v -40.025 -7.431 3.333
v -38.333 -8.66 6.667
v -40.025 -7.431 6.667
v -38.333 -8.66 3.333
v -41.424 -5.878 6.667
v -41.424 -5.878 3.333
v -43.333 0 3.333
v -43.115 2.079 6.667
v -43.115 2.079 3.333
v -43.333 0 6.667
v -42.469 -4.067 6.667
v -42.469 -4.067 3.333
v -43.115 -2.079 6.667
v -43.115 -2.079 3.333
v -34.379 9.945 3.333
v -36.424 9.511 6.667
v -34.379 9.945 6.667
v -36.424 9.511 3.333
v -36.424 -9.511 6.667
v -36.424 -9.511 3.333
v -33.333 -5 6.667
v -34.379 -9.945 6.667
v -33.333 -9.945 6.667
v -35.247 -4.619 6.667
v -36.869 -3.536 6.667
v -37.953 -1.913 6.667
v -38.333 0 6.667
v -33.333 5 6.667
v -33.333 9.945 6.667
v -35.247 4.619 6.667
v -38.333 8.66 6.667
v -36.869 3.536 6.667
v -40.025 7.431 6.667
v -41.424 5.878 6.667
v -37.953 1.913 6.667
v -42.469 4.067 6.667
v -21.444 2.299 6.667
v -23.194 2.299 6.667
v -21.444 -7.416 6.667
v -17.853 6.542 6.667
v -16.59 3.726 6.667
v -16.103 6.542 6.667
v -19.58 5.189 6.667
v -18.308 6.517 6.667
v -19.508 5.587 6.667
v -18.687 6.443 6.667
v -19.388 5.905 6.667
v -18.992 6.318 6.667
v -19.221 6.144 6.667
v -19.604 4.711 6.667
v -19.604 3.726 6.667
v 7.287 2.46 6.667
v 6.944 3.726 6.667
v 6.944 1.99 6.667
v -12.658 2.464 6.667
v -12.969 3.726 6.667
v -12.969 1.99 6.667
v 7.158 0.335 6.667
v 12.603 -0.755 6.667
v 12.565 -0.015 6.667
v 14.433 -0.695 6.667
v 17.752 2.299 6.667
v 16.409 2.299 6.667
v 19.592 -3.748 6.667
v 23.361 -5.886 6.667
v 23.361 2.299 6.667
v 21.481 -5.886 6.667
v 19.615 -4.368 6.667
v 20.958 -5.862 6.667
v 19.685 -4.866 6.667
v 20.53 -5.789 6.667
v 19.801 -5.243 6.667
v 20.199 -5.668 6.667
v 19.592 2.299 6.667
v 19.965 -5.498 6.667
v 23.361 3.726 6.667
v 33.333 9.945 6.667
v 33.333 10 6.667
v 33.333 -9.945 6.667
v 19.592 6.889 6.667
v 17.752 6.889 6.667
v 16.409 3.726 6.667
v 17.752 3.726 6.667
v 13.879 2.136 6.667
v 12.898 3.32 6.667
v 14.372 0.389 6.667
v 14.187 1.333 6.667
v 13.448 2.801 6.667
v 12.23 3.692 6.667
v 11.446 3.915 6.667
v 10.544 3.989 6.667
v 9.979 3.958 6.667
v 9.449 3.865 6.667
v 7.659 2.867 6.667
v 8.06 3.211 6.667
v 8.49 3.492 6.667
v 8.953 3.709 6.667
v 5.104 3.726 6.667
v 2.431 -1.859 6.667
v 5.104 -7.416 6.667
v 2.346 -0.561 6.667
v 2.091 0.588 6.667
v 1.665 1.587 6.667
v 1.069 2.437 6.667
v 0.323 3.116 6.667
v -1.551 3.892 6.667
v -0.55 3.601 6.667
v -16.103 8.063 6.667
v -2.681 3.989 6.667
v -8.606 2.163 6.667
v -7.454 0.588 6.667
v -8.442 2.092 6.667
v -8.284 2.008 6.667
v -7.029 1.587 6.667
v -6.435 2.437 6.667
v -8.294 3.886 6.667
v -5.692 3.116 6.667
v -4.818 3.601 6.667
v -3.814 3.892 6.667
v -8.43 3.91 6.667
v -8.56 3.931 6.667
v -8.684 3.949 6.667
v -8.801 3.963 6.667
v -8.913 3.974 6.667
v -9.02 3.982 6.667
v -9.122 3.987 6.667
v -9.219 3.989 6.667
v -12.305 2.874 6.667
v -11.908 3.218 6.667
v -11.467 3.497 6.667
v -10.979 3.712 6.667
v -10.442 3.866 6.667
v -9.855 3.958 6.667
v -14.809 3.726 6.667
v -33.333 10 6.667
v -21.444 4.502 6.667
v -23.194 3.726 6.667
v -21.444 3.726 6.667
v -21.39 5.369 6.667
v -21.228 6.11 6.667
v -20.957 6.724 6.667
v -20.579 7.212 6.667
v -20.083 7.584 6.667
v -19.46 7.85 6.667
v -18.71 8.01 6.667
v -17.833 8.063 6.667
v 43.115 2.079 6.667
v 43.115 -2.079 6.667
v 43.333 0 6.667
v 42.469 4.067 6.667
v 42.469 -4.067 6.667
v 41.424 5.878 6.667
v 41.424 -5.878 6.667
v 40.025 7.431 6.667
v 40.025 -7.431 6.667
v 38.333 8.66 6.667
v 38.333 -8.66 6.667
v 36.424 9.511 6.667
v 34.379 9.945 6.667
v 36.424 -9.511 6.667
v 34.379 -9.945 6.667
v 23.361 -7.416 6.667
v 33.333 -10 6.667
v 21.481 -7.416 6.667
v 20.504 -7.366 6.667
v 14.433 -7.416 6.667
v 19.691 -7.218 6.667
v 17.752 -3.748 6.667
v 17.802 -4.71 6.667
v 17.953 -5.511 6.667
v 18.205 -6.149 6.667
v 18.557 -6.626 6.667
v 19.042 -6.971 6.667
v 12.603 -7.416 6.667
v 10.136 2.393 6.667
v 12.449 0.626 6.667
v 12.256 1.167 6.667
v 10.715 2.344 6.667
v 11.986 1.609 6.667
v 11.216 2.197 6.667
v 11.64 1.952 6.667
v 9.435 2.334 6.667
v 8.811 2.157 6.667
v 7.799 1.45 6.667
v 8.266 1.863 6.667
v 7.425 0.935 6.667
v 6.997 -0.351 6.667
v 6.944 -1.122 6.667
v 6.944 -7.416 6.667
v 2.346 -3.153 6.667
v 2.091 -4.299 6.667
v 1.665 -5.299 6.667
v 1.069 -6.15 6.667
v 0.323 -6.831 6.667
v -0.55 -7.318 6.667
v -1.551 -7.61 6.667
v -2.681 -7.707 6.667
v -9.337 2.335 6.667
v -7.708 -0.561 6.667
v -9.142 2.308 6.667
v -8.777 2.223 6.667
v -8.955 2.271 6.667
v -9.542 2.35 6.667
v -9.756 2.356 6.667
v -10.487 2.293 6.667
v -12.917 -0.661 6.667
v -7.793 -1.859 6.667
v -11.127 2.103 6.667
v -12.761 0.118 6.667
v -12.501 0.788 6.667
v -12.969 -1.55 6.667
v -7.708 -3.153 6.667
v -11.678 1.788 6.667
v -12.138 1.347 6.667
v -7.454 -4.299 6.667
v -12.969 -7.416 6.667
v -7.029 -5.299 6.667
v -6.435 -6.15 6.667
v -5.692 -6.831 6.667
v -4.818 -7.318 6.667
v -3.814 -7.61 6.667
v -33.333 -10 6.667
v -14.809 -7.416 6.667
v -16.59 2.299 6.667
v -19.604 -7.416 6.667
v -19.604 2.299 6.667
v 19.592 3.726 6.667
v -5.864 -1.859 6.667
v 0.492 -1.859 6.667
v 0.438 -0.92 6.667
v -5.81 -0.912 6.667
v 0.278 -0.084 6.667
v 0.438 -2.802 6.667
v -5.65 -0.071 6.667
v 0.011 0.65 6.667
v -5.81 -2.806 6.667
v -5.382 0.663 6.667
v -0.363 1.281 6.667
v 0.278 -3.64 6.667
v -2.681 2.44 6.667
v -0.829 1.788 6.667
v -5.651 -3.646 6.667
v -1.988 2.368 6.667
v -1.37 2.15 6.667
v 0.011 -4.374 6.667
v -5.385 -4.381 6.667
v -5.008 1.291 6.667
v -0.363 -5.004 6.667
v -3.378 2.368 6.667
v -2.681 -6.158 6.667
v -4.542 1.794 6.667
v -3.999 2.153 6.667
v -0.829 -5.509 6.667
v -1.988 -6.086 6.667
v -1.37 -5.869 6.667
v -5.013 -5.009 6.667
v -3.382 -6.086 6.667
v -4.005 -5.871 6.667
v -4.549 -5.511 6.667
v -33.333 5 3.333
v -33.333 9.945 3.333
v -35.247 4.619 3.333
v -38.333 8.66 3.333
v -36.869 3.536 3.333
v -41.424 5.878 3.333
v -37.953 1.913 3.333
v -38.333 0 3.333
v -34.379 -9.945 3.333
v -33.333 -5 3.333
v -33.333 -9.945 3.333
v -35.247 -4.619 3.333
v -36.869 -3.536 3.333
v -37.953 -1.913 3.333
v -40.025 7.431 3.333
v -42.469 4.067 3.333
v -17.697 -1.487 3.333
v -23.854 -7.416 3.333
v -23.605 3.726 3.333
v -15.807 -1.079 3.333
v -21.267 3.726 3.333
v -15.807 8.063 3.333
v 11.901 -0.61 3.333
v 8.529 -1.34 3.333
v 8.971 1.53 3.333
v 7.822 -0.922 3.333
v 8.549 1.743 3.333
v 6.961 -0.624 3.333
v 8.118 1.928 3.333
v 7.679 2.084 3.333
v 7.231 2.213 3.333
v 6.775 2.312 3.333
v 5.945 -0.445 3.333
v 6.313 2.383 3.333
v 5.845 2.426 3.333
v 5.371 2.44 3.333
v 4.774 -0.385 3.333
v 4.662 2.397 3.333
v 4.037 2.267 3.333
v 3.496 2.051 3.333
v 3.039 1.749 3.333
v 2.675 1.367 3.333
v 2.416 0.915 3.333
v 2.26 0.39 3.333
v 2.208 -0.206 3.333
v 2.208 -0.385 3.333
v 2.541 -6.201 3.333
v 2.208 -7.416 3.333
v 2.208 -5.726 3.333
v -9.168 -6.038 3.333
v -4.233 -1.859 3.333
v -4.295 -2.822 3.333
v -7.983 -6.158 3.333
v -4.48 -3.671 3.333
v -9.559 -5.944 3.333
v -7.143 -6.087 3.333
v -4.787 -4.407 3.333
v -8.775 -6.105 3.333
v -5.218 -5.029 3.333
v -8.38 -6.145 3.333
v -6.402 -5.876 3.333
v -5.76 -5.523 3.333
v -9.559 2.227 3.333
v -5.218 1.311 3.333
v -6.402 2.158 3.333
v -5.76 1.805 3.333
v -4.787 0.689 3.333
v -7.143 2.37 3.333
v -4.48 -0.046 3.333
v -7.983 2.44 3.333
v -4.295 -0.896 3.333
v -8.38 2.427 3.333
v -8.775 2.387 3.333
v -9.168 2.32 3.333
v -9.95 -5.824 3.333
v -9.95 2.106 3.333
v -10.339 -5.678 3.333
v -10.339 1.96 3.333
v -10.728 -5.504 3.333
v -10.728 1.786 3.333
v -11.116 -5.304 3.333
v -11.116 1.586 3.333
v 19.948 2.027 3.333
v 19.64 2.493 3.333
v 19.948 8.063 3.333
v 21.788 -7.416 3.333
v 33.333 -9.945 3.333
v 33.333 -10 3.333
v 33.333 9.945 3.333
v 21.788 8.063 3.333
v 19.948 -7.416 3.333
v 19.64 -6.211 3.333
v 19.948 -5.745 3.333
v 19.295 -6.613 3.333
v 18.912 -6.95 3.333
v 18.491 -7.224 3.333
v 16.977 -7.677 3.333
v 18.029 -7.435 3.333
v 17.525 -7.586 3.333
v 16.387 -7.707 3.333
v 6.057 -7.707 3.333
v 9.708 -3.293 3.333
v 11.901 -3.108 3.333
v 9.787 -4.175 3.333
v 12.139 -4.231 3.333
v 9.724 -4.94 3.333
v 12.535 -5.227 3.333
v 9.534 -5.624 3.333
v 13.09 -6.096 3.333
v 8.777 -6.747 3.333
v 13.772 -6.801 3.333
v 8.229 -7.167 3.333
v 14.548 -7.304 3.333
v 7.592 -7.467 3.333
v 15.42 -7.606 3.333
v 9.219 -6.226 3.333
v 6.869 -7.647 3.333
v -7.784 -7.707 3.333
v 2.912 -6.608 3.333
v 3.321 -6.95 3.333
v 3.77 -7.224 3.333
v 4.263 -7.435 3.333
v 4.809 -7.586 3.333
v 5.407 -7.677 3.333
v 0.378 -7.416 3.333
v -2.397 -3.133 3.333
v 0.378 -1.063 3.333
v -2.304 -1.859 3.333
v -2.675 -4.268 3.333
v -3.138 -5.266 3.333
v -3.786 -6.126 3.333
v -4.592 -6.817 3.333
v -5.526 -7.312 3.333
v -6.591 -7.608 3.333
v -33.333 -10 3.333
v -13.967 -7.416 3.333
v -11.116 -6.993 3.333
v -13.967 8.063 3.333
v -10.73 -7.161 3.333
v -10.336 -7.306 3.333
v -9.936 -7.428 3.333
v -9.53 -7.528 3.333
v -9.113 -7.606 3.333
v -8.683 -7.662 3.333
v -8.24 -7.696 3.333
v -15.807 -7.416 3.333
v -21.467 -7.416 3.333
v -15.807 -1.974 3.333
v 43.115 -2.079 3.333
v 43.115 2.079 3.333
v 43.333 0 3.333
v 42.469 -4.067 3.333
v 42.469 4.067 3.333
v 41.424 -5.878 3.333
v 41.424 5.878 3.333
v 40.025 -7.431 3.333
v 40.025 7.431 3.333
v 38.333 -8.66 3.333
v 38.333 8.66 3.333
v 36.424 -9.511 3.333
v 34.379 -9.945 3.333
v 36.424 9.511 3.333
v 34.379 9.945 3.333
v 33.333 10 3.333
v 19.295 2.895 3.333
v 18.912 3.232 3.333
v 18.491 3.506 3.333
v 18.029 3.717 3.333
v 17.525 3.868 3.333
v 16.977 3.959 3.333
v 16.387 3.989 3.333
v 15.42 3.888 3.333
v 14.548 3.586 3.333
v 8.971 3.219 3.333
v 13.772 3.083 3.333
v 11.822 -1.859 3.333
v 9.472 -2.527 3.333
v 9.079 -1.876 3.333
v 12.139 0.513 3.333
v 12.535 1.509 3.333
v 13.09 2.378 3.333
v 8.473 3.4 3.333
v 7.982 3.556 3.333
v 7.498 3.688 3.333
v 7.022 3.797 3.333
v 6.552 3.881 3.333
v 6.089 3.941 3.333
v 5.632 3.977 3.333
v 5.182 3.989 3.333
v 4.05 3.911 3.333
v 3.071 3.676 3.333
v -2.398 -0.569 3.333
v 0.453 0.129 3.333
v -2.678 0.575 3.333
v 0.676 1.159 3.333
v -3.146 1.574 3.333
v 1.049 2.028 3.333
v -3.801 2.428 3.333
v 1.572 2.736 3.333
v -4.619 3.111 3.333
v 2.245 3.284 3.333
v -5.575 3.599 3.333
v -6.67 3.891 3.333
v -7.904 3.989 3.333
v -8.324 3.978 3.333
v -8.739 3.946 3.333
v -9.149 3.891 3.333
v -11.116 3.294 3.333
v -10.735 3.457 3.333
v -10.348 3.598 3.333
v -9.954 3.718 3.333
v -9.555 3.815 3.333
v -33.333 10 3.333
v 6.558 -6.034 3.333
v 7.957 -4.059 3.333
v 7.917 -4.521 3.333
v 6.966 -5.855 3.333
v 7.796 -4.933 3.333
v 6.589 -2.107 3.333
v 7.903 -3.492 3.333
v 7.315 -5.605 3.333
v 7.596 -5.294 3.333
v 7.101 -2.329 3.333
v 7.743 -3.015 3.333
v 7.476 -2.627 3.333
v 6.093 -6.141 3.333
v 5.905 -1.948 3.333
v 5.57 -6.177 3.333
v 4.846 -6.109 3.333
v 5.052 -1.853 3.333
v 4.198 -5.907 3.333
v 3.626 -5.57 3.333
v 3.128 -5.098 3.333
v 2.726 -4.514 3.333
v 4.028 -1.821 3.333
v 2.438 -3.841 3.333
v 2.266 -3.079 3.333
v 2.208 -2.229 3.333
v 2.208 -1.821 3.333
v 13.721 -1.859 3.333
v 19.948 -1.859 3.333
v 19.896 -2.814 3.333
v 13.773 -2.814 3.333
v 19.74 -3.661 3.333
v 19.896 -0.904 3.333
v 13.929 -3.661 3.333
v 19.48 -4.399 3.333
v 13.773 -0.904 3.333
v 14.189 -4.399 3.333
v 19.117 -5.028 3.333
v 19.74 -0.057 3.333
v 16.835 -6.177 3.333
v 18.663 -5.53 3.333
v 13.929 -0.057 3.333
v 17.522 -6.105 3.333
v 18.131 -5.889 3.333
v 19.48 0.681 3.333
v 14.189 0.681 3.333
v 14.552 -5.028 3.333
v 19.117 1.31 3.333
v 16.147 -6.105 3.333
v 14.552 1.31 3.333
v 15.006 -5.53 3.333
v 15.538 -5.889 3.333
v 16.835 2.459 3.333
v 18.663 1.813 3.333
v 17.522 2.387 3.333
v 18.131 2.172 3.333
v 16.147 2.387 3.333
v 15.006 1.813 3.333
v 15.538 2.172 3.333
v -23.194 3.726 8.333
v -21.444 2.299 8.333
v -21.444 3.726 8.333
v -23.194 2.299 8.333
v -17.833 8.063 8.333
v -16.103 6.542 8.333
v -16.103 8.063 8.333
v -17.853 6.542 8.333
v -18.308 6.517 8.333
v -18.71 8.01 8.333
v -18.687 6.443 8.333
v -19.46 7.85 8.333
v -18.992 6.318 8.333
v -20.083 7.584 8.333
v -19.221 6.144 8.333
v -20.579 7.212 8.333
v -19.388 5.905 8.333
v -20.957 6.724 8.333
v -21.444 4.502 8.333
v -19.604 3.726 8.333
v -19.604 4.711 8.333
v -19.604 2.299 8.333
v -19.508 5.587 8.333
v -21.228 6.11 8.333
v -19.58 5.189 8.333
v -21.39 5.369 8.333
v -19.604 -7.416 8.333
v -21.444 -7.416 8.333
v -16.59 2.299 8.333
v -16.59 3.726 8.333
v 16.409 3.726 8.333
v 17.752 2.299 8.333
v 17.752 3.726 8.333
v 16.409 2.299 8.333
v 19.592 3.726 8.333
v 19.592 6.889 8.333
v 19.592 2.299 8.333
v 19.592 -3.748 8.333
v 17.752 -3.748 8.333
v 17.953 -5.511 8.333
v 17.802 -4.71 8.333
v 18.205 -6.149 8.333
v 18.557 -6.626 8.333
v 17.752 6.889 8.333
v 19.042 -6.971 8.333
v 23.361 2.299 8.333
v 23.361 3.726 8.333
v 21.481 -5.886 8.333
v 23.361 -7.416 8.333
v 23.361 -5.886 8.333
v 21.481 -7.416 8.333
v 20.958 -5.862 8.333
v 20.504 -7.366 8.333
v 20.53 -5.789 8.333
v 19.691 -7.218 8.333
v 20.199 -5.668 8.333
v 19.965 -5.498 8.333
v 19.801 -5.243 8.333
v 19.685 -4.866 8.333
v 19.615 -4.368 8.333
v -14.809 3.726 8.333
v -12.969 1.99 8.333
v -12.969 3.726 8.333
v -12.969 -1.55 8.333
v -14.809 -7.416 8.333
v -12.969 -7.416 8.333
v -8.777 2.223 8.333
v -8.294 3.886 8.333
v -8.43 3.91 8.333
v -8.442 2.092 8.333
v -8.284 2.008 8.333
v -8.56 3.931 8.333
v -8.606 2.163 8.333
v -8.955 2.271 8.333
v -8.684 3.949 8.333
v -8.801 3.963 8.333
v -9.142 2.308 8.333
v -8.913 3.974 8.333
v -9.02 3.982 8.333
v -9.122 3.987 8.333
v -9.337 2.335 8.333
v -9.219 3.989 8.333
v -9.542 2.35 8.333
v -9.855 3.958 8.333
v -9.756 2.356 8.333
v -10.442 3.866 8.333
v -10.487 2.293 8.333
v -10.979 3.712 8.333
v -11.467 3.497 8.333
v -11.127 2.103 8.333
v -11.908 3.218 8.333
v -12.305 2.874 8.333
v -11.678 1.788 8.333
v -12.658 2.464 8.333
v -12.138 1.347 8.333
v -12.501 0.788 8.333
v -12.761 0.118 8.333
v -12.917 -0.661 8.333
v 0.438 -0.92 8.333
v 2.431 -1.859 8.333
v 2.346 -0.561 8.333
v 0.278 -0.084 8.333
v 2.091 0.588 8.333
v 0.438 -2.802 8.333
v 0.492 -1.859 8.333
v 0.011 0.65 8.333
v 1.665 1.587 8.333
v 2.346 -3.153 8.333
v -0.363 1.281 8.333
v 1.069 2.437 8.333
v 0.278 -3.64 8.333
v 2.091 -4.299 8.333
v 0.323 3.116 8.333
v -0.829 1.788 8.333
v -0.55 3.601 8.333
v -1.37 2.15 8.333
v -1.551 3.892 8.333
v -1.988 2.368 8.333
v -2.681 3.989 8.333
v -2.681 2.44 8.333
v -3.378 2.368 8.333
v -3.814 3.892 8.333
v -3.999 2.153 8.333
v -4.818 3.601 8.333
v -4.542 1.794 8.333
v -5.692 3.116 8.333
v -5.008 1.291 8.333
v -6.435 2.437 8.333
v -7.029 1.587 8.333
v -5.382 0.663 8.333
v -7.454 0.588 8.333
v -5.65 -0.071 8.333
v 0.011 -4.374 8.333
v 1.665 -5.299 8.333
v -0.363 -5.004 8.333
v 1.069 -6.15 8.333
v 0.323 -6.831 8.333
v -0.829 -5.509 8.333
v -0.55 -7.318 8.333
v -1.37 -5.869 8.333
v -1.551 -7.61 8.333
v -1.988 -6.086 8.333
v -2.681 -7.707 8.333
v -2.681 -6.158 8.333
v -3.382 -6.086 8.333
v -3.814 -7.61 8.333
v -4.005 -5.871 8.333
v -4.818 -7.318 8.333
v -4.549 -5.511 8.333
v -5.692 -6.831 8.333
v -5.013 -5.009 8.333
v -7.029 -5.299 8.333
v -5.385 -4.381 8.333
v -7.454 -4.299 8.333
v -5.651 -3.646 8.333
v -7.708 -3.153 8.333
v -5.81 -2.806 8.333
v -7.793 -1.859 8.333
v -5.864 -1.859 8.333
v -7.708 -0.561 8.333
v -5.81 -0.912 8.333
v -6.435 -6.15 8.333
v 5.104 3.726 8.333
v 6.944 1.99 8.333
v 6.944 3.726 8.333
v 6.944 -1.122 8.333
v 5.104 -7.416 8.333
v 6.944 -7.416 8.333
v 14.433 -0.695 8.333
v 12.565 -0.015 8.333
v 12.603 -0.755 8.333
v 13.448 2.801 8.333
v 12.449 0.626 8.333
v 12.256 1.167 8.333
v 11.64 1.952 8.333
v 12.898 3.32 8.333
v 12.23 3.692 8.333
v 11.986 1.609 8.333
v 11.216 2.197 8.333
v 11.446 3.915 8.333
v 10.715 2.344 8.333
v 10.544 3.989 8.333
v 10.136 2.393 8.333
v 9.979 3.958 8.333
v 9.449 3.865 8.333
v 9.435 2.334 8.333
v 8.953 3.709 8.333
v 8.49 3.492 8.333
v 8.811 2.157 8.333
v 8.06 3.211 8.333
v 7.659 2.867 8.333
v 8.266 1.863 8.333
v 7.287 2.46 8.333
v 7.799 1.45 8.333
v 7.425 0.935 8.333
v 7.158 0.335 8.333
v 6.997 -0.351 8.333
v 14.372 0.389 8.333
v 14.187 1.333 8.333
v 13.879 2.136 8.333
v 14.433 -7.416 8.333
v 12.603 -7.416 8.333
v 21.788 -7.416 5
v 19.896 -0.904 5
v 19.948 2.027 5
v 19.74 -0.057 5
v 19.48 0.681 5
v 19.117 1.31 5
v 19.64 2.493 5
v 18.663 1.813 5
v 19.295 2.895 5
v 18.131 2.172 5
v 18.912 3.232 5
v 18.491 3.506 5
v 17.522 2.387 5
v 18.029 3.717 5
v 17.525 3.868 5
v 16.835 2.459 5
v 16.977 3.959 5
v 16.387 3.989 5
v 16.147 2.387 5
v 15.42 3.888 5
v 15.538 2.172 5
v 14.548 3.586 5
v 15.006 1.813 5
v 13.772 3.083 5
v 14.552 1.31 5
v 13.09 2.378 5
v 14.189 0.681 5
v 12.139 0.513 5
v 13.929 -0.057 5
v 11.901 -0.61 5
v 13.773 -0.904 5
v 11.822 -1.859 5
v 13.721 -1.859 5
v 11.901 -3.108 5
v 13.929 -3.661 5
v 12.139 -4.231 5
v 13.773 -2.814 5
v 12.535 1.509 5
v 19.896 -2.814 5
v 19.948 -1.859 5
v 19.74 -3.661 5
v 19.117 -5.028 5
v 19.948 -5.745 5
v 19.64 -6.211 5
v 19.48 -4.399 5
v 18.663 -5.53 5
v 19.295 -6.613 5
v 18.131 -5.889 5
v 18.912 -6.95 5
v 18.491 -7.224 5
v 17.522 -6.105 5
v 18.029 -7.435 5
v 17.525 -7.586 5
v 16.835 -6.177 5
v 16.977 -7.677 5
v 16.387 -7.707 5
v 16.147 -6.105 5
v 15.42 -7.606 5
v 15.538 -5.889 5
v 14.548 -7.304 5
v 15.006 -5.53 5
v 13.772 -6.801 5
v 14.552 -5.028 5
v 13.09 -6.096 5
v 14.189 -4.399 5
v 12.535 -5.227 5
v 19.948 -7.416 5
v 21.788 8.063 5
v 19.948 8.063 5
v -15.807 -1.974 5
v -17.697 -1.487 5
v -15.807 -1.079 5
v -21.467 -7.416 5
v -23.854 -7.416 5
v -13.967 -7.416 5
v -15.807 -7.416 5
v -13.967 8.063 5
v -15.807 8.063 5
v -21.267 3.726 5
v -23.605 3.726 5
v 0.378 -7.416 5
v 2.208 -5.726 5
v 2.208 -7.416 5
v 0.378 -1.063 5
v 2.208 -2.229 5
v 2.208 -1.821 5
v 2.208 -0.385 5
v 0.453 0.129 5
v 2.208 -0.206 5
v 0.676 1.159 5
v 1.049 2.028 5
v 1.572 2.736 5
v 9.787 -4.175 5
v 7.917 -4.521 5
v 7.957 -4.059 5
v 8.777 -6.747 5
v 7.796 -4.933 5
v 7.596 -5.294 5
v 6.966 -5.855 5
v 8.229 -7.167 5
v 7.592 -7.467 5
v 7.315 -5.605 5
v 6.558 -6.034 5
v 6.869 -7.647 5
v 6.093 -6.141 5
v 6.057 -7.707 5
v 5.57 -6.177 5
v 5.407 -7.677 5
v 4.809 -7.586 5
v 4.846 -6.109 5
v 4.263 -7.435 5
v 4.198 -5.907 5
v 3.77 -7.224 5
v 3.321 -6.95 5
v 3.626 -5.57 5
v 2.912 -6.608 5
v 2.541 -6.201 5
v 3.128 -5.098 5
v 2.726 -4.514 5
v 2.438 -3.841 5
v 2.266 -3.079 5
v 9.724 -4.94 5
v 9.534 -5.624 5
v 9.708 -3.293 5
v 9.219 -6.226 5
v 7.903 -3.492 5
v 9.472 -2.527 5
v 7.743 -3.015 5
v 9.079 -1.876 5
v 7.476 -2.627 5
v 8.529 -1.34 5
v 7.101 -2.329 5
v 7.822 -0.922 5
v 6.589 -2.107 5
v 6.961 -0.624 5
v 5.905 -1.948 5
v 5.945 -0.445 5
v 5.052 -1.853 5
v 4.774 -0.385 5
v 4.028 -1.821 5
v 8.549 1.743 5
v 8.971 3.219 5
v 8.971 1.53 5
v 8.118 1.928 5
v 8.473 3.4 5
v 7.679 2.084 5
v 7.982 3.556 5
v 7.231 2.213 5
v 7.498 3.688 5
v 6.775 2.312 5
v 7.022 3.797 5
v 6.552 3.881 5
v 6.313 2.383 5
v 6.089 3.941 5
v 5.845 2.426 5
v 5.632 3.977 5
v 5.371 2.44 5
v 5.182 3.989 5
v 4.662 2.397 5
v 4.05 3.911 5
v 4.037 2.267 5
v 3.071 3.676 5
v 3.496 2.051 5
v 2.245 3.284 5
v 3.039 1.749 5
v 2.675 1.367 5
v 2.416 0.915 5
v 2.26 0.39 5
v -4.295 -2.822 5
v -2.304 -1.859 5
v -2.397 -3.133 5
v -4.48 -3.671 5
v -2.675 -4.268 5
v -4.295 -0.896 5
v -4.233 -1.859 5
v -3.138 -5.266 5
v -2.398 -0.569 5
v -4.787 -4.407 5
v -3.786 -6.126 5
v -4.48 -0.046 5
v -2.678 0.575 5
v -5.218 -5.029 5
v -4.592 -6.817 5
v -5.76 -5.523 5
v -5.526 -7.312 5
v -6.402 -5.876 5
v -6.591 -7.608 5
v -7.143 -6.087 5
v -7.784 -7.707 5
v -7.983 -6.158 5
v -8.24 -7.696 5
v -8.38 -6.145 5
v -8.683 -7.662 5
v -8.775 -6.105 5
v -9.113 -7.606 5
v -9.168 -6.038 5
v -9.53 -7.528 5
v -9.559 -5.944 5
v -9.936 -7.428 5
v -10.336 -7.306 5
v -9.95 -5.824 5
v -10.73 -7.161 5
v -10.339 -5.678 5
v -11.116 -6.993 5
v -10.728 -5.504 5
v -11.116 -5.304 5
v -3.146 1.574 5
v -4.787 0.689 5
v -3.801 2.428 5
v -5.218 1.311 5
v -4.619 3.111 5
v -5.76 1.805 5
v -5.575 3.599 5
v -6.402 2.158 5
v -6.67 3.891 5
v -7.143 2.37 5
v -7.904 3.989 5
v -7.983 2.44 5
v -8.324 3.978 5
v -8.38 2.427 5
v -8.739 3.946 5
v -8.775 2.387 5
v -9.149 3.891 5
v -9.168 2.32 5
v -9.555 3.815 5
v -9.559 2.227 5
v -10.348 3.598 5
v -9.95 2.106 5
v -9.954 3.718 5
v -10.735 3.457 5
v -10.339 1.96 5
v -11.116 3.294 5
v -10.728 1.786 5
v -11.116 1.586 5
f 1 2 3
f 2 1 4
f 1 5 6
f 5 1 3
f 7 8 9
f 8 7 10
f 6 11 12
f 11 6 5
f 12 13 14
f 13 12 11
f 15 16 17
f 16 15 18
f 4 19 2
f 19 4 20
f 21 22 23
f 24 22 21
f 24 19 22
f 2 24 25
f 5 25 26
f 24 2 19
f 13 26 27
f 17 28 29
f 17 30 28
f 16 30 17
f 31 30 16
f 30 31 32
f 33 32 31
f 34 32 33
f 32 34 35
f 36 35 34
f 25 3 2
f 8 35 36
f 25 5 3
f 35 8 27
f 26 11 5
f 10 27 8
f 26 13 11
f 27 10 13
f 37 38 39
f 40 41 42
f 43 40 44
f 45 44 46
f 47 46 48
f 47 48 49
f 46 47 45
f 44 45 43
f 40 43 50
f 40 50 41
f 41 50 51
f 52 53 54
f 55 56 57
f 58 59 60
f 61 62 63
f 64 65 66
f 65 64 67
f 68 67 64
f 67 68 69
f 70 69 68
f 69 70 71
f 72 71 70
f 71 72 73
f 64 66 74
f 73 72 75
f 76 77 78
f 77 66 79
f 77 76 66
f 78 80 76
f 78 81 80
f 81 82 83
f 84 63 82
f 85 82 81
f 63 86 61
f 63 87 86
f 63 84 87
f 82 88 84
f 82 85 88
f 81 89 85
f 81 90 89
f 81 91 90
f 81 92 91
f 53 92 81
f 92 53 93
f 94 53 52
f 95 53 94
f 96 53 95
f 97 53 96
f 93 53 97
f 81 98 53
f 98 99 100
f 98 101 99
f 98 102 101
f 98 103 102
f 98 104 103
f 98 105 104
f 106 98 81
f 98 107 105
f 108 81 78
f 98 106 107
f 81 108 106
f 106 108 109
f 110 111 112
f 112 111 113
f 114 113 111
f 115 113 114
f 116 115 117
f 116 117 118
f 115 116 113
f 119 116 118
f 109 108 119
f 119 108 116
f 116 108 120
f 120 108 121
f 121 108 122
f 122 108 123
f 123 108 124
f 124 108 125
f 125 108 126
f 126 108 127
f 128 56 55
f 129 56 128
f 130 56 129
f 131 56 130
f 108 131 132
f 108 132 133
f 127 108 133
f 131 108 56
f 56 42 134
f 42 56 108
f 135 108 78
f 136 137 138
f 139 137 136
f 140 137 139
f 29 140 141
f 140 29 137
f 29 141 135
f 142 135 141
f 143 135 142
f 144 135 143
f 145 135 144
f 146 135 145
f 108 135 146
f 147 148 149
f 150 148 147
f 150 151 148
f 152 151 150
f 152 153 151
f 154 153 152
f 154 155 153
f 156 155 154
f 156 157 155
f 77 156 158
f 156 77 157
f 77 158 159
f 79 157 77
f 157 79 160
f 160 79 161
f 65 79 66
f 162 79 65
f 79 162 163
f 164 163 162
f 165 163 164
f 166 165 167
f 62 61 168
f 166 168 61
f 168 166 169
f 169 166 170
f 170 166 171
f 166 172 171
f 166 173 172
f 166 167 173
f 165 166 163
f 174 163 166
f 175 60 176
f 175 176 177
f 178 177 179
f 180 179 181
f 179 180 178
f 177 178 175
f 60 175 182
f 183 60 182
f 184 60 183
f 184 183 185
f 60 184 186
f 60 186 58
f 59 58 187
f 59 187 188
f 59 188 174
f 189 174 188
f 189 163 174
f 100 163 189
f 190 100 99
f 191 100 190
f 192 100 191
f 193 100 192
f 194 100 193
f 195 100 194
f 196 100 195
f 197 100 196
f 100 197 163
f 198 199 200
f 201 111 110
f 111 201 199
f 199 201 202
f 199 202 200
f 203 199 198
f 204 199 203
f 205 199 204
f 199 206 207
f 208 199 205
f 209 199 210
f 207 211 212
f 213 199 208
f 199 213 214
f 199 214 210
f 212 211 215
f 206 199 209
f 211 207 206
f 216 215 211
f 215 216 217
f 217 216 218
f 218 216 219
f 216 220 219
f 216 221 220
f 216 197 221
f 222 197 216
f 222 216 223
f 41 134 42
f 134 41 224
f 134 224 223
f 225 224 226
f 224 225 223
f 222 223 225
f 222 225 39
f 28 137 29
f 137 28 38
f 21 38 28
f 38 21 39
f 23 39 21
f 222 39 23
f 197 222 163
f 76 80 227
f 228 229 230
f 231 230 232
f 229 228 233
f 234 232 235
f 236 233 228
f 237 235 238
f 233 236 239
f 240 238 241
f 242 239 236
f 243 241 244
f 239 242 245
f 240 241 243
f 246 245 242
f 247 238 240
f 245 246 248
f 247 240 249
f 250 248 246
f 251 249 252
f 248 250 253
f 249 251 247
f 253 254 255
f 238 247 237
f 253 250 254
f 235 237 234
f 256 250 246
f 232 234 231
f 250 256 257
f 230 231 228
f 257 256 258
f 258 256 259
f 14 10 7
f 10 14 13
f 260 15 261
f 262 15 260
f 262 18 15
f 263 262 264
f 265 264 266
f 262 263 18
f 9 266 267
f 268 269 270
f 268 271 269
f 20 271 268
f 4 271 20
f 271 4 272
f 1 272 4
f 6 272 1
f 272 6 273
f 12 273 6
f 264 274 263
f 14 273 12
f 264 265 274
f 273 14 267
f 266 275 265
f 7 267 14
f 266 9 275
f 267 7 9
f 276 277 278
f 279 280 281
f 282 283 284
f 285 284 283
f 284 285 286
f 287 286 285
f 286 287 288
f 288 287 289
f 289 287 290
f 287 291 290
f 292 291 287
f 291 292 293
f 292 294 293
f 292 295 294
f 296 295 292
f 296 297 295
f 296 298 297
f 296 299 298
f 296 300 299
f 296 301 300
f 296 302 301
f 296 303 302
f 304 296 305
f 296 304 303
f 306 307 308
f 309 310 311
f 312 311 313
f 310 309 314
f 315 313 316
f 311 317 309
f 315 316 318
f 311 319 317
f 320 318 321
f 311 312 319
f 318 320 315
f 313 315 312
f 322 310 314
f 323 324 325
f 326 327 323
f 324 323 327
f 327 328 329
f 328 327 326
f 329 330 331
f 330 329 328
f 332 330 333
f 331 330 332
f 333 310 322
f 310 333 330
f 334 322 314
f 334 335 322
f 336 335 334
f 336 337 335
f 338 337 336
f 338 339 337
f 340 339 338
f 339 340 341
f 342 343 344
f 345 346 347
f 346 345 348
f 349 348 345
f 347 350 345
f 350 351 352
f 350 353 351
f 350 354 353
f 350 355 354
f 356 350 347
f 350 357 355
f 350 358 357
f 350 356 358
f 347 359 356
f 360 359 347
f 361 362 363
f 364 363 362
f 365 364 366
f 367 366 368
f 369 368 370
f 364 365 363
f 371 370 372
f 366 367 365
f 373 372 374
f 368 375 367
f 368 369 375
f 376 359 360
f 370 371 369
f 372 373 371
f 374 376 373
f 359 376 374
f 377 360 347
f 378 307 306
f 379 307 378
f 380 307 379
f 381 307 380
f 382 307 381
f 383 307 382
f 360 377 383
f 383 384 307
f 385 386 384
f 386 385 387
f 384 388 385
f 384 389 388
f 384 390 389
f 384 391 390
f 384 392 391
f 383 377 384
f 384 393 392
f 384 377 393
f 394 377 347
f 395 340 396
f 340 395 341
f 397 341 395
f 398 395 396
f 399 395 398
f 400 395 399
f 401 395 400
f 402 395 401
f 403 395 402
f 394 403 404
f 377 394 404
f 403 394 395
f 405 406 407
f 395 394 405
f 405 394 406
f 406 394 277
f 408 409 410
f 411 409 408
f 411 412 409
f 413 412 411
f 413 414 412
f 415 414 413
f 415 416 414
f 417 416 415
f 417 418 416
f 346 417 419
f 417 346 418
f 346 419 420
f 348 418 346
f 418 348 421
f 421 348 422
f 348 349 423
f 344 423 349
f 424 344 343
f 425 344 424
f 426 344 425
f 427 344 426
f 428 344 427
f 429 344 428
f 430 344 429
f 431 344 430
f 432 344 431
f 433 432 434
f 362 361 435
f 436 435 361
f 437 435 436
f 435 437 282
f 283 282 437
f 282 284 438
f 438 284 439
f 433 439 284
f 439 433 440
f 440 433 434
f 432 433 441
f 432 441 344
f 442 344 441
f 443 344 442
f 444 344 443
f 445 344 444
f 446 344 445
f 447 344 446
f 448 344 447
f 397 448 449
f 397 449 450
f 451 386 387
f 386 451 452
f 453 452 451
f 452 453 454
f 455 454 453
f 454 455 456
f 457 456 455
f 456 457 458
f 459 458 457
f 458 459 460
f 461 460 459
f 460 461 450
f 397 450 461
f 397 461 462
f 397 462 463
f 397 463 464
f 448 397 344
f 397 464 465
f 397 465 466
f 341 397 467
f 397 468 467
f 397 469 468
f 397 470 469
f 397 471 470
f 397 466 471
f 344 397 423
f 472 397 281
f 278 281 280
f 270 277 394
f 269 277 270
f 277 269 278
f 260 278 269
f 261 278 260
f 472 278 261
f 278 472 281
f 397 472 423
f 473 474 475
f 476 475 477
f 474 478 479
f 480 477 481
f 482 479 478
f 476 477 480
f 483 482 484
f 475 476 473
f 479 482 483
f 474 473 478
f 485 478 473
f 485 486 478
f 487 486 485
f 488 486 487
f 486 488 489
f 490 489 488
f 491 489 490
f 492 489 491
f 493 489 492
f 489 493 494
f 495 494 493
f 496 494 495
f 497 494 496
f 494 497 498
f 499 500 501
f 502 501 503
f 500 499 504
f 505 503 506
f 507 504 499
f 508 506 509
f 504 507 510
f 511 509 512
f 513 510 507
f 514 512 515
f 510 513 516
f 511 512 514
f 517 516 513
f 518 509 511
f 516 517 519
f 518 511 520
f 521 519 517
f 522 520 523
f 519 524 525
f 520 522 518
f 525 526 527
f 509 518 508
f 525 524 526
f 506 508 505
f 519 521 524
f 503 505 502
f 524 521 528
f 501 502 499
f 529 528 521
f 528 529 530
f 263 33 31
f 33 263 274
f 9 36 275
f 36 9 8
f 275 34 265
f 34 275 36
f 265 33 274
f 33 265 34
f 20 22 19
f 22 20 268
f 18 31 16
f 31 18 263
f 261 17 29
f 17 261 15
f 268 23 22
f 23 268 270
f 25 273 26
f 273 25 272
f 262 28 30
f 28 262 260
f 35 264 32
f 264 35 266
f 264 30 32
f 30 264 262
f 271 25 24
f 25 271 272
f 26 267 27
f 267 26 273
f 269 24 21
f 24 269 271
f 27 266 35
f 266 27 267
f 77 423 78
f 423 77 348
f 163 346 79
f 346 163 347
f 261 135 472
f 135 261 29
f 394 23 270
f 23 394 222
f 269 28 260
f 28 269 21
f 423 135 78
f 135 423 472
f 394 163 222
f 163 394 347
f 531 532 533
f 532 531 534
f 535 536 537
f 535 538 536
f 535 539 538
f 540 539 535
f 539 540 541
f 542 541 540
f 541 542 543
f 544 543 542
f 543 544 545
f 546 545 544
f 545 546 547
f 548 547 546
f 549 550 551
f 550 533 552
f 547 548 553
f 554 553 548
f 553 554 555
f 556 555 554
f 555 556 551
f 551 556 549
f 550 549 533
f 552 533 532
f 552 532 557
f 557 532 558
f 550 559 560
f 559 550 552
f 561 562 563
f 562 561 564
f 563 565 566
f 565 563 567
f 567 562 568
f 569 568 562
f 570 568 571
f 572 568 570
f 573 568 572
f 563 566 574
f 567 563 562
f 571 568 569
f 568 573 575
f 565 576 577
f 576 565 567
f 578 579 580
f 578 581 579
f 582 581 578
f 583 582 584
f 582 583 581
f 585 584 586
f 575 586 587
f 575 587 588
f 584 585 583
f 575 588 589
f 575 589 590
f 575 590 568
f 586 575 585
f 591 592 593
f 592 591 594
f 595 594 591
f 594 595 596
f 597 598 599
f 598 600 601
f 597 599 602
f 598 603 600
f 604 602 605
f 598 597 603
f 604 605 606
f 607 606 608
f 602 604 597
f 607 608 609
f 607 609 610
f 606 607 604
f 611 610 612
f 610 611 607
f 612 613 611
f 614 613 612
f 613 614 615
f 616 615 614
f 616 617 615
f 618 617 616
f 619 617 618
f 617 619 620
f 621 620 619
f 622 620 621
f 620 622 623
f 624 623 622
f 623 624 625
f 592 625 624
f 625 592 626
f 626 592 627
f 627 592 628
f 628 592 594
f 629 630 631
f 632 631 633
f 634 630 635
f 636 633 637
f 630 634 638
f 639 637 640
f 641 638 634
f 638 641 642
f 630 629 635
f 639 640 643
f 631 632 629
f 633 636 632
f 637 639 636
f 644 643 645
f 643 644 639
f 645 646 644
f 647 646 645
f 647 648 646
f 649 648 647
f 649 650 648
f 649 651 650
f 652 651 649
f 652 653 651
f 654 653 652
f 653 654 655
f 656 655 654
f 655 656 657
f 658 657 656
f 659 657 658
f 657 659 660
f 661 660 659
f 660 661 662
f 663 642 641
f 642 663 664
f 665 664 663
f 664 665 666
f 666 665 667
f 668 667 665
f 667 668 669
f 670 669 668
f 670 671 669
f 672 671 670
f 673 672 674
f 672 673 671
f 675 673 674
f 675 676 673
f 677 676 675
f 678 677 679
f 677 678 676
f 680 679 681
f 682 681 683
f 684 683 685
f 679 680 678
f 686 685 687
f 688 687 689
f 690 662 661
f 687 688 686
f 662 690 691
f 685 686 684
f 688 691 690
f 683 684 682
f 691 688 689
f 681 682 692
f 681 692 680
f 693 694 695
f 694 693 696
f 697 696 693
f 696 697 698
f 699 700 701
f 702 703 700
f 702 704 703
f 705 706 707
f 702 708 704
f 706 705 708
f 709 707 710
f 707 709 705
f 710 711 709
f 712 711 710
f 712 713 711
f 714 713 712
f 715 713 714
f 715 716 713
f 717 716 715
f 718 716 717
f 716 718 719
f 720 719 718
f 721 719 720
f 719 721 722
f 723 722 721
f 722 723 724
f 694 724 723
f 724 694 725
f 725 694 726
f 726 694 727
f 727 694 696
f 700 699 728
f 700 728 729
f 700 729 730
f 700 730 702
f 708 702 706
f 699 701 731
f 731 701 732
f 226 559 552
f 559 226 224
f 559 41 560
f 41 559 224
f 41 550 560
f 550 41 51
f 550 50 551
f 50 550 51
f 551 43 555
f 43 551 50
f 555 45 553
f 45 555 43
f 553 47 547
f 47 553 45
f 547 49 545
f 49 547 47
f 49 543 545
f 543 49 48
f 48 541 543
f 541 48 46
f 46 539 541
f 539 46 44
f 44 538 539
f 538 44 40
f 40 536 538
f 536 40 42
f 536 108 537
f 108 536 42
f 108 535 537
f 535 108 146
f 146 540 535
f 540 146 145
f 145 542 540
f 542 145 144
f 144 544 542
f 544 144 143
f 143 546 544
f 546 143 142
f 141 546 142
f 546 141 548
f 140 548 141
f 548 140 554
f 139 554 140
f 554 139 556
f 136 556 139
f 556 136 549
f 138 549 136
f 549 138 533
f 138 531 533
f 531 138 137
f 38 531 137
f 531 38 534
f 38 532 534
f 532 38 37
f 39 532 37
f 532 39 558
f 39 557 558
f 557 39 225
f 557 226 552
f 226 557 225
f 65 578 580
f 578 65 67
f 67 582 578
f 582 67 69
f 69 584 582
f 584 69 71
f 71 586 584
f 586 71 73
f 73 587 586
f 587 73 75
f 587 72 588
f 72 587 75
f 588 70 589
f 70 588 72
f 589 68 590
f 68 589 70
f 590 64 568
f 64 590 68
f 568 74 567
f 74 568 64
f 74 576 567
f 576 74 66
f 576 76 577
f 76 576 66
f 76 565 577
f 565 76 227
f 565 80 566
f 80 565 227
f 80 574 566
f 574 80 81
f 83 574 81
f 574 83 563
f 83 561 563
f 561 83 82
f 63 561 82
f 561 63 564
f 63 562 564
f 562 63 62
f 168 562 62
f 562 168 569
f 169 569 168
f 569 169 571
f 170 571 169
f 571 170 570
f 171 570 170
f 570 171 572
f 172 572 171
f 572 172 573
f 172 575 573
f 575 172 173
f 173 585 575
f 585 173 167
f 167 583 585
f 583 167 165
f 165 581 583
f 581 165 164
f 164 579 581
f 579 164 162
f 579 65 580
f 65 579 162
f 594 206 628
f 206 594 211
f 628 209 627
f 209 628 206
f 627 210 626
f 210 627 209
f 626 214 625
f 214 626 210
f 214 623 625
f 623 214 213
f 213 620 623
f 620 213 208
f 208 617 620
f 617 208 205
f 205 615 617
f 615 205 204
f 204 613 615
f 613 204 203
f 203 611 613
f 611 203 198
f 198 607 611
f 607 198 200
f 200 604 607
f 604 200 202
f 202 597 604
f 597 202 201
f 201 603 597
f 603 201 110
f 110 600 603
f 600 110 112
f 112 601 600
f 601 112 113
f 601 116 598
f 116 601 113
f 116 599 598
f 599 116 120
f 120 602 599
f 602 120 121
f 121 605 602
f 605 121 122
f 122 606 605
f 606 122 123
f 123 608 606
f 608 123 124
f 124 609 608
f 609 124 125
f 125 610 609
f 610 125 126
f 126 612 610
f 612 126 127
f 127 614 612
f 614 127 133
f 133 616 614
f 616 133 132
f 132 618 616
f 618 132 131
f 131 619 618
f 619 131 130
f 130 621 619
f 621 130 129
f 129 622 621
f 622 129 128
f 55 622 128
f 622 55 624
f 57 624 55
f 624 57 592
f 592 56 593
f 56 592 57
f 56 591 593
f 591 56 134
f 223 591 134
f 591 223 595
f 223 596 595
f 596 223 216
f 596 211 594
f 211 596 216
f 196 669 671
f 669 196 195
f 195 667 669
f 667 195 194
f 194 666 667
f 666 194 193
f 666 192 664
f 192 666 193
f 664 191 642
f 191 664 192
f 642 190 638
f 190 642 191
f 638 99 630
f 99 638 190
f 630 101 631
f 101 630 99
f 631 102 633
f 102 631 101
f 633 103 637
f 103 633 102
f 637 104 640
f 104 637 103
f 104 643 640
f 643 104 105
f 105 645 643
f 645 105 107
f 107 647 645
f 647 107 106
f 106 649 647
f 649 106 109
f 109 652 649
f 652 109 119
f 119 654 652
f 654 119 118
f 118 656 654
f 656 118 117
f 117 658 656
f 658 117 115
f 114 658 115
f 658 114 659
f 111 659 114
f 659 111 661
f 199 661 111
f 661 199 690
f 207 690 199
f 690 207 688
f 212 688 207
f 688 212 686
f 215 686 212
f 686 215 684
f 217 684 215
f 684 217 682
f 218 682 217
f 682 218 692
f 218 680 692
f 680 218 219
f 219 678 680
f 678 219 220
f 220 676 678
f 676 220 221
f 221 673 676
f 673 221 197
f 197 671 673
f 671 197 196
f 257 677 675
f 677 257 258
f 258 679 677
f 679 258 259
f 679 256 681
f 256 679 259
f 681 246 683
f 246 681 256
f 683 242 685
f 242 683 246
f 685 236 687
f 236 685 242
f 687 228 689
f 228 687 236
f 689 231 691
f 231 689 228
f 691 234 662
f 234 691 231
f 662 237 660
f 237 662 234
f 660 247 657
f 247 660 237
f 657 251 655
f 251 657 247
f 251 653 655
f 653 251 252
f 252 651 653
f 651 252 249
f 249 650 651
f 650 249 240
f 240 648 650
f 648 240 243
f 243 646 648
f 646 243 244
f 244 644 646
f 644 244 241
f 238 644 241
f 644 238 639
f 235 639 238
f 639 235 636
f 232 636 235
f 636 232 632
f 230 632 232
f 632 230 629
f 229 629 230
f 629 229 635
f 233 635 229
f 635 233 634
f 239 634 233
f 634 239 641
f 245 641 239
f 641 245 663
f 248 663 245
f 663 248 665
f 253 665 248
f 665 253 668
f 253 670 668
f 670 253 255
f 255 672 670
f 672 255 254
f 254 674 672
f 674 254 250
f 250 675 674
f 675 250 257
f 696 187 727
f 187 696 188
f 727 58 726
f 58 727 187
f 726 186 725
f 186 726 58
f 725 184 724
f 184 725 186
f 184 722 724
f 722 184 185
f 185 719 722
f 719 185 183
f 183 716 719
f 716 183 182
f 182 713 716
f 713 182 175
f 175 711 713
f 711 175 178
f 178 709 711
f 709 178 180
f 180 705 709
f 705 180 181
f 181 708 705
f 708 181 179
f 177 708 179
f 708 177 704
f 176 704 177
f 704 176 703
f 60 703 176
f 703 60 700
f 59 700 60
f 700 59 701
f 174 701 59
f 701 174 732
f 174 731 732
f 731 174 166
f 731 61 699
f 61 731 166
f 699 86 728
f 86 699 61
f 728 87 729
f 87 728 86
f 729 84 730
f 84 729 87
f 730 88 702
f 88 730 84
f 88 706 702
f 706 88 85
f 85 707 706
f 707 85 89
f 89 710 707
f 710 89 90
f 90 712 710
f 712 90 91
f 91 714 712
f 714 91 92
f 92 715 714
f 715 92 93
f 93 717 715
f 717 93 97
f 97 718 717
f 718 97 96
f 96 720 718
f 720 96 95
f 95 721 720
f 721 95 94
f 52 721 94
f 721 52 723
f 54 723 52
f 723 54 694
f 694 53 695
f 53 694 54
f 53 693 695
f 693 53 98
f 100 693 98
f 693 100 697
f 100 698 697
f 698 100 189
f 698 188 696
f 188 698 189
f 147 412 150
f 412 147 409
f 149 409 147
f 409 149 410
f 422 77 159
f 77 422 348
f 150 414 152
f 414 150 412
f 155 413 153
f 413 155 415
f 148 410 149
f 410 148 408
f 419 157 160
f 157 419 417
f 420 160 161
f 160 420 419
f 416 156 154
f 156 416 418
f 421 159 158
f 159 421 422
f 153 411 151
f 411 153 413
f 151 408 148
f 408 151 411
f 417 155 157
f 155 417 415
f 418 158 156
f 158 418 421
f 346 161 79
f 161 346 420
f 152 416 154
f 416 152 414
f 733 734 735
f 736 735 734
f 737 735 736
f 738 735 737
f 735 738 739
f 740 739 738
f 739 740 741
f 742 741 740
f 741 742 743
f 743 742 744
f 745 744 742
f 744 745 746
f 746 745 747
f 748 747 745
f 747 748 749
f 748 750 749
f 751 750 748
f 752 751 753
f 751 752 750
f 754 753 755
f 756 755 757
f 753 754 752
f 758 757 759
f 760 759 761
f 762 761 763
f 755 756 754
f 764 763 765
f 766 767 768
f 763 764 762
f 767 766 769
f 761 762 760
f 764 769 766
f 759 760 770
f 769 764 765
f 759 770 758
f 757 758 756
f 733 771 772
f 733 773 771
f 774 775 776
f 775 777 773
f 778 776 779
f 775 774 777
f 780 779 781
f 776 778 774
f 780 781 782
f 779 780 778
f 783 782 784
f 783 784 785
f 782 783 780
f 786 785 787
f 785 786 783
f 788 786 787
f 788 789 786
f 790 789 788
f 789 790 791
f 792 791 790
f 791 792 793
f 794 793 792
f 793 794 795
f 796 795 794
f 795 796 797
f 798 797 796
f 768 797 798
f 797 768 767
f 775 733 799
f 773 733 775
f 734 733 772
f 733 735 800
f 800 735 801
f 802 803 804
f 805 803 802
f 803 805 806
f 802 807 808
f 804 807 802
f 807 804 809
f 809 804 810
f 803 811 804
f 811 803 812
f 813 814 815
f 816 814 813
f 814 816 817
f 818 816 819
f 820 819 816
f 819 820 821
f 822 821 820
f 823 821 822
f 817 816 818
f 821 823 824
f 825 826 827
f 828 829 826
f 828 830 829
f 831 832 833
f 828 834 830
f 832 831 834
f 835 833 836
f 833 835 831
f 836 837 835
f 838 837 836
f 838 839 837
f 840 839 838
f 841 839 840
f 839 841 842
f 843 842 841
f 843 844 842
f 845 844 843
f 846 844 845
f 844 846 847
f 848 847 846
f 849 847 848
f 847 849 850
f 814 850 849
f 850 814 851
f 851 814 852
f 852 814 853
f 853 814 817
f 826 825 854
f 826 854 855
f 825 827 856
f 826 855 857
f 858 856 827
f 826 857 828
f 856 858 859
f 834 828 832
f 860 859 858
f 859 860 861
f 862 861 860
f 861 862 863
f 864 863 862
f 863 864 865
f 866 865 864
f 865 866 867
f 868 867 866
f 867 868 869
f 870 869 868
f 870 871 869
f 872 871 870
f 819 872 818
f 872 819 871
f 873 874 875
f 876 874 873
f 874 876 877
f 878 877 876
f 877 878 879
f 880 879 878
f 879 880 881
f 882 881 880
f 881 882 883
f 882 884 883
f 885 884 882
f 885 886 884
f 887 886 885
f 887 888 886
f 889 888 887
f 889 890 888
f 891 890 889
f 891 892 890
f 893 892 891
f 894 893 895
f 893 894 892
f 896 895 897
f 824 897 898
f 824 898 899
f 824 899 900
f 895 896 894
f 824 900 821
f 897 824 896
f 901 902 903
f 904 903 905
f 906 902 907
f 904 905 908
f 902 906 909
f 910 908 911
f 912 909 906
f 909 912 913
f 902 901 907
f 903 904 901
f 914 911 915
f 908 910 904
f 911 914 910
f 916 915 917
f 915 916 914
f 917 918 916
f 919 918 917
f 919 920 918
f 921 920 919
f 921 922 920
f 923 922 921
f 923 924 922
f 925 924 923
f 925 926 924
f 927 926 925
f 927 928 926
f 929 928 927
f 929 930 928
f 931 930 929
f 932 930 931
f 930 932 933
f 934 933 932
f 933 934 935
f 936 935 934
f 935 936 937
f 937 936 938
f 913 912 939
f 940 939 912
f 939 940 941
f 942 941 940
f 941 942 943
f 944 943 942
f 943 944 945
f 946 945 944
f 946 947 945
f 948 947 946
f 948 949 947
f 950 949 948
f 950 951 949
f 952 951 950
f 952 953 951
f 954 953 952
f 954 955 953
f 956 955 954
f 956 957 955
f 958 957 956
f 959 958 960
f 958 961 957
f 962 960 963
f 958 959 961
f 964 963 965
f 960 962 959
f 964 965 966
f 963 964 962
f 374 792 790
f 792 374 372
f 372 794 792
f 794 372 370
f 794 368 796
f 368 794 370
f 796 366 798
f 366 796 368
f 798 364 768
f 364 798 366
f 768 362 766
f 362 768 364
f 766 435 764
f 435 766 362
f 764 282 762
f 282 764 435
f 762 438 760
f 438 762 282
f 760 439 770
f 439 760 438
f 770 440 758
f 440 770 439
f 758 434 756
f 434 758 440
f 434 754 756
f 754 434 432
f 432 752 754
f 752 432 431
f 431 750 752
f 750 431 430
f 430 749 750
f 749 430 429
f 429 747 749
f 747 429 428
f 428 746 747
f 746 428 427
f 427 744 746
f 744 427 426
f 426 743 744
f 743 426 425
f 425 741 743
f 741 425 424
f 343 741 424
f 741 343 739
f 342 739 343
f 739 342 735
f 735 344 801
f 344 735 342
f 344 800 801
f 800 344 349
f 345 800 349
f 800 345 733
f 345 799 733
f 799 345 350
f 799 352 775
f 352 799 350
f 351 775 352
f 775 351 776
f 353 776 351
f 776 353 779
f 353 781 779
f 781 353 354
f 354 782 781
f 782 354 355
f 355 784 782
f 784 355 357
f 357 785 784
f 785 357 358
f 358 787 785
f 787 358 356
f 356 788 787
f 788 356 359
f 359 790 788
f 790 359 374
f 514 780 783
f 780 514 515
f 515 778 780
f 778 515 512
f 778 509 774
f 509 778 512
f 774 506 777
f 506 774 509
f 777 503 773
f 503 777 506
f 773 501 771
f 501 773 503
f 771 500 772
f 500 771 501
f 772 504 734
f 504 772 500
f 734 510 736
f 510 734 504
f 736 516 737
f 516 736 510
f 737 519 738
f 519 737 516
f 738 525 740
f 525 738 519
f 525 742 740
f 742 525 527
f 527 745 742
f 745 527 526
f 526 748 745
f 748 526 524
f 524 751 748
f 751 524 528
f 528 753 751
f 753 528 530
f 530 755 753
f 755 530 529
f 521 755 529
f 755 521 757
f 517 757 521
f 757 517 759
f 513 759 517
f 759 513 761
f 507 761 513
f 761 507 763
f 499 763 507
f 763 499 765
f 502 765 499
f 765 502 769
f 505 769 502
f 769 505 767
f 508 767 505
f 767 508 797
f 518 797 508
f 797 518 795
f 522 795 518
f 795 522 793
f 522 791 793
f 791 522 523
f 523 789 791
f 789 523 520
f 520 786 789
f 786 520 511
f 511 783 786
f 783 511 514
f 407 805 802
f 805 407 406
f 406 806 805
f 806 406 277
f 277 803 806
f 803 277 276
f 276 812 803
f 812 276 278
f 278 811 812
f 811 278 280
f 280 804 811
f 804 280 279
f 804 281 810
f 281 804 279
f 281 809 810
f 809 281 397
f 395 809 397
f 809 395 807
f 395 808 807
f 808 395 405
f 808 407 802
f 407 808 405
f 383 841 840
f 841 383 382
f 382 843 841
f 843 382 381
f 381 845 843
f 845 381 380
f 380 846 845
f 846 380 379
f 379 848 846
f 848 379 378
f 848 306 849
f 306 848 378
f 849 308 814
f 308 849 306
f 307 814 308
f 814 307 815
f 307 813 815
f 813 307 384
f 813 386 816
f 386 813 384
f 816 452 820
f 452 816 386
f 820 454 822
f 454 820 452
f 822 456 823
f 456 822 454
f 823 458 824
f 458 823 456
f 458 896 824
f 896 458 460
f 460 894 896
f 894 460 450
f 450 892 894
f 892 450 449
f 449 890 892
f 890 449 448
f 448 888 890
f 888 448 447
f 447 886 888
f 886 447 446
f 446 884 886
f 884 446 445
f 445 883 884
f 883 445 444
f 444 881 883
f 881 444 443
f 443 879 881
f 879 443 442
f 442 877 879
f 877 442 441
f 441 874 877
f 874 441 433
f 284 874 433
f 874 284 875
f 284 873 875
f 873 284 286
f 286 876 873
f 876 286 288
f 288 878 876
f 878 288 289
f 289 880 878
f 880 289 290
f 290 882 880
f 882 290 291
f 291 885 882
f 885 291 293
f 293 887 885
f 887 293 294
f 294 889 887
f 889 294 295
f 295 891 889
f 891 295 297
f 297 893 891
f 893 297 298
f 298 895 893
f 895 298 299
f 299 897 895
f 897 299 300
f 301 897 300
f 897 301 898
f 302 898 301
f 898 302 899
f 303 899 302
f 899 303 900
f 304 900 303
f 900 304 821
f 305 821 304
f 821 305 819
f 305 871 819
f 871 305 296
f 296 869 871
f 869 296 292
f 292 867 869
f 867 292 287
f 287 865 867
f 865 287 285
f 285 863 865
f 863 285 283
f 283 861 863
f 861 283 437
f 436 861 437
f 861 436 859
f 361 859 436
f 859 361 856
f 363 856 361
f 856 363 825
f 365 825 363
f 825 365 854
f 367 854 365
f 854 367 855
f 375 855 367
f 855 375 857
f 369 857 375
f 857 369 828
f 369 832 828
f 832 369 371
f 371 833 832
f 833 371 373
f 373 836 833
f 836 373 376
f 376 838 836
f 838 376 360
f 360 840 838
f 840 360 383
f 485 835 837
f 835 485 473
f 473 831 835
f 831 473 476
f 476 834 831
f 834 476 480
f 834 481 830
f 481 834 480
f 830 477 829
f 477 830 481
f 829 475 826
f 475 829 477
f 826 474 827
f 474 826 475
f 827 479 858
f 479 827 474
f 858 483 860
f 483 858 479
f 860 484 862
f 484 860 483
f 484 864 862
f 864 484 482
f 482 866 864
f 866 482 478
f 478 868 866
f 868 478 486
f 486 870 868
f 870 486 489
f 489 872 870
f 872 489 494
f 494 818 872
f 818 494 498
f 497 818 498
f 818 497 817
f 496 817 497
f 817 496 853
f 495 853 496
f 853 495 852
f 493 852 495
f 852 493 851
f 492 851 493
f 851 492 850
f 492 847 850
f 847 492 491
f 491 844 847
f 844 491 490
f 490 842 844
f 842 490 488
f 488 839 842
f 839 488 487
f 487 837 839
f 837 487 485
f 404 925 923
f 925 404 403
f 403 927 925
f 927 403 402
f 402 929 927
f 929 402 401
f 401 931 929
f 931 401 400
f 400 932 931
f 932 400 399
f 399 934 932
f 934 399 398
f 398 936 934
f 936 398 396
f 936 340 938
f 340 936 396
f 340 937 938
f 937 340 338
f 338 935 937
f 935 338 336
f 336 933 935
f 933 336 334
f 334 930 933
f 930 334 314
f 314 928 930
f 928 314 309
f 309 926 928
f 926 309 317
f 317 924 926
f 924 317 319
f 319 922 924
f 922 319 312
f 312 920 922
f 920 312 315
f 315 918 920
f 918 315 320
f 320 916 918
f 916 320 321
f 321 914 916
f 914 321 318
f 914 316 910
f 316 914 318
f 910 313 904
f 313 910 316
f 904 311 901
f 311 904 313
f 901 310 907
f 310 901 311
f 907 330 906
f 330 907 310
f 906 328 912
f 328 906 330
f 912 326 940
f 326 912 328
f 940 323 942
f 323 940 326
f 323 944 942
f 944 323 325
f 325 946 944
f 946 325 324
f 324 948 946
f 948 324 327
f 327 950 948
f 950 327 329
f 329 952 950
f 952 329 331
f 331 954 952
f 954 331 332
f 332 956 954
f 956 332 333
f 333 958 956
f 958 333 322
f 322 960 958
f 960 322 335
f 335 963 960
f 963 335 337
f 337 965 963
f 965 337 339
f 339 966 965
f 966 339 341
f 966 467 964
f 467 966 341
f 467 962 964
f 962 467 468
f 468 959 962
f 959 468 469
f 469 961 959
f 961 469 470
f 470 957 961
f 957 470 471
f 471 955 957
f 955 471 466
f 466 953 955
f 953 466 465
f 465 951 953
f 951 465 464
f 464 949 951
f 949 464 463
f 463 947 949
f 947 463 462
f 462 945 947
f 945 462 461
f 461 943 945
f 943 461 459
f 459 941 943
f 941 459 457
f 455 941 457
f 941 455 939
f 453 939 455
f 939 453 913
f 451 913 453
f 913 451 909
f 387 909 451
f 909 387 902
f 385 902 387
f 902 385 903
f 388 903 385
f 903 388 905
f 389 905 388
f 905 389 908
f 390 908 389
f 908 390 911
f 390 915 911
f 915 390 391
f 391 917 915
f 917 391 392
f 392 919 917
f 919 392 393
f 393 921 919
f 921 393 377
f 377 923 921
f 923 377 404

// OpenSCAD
// Name Tag.scad - two sided name tag with hole
// name for front - embossed
nfront="front";
// name for back - recessed
nback="back";
// tag width in mm
size=20;
// unused
nlen=1;

// Module instantiation
LetterTag();

// Module definition.

module LetterTag() {

  difference(){
      
    union() {
 
    nlen = len(nfront);
         if(len(nback)>len(nfront)){nlen=len(nback);}
  
        translate([0,0,size/4]) cube([(size*0.6*nlen)+size/3,size,size/6
       ], center=true);
    {
   
        translate([0,0,size/4]) {
            // convexity is needed for correct preview
            // since characters can be highly concave
            linear_extrude(height=size/6, convexity=4)            
                text(nfront, 
                     size=size*22/30,
                     font="Bitstream Vera Sans",
                     halign="center",
                     valign="center");
        }
        }
        translate([((size*0.3*nlen)+size/6),0,size/6]){
            linear_extrude(height=size/6)
            circle(d=size);
    } // translate
    difference(){
            translate([-((size*0.3*nlen)+size/6),0,size/6]){
              linear_extrude(height=size/6)
              circle(d=size);} // end semicircle
            translate([-((size*0.3*nlen)+size/6),0,size/6]){
              linear_extrude(height=size/6)
              circle(d=size/2); 
          }// translate hole    
      } 
  
     } //union
       mirror(0,1,0) { translate([0,0,0]) {
          
            linear_extrude(height=size/4, convexity=4)            
                text(nback, 
                     size=size*22/30,
                     font="Bitstream Vera Sans",
                     halign="center",
                     valign="center");
                                          }
        }//mirror

               
} // outer difference
}  // lettertag

echo(version=version());
// Written by Marius Kintel <marius@kintel.net>
// adapted by Hamish Low May 2018 to make name tags
//
// To the extent possible under law, the author(s) have dedicated all
// copyright and related and neighboring rights to this software to the
// public domain worldwide. This software is distributed without any
// warranty.
//
// You should have received a copy of the CC0 Public Domain
// Dedication along with this software.
// If not, see <http://creativecommons.org/publicdomain/zero/1.0/>.
